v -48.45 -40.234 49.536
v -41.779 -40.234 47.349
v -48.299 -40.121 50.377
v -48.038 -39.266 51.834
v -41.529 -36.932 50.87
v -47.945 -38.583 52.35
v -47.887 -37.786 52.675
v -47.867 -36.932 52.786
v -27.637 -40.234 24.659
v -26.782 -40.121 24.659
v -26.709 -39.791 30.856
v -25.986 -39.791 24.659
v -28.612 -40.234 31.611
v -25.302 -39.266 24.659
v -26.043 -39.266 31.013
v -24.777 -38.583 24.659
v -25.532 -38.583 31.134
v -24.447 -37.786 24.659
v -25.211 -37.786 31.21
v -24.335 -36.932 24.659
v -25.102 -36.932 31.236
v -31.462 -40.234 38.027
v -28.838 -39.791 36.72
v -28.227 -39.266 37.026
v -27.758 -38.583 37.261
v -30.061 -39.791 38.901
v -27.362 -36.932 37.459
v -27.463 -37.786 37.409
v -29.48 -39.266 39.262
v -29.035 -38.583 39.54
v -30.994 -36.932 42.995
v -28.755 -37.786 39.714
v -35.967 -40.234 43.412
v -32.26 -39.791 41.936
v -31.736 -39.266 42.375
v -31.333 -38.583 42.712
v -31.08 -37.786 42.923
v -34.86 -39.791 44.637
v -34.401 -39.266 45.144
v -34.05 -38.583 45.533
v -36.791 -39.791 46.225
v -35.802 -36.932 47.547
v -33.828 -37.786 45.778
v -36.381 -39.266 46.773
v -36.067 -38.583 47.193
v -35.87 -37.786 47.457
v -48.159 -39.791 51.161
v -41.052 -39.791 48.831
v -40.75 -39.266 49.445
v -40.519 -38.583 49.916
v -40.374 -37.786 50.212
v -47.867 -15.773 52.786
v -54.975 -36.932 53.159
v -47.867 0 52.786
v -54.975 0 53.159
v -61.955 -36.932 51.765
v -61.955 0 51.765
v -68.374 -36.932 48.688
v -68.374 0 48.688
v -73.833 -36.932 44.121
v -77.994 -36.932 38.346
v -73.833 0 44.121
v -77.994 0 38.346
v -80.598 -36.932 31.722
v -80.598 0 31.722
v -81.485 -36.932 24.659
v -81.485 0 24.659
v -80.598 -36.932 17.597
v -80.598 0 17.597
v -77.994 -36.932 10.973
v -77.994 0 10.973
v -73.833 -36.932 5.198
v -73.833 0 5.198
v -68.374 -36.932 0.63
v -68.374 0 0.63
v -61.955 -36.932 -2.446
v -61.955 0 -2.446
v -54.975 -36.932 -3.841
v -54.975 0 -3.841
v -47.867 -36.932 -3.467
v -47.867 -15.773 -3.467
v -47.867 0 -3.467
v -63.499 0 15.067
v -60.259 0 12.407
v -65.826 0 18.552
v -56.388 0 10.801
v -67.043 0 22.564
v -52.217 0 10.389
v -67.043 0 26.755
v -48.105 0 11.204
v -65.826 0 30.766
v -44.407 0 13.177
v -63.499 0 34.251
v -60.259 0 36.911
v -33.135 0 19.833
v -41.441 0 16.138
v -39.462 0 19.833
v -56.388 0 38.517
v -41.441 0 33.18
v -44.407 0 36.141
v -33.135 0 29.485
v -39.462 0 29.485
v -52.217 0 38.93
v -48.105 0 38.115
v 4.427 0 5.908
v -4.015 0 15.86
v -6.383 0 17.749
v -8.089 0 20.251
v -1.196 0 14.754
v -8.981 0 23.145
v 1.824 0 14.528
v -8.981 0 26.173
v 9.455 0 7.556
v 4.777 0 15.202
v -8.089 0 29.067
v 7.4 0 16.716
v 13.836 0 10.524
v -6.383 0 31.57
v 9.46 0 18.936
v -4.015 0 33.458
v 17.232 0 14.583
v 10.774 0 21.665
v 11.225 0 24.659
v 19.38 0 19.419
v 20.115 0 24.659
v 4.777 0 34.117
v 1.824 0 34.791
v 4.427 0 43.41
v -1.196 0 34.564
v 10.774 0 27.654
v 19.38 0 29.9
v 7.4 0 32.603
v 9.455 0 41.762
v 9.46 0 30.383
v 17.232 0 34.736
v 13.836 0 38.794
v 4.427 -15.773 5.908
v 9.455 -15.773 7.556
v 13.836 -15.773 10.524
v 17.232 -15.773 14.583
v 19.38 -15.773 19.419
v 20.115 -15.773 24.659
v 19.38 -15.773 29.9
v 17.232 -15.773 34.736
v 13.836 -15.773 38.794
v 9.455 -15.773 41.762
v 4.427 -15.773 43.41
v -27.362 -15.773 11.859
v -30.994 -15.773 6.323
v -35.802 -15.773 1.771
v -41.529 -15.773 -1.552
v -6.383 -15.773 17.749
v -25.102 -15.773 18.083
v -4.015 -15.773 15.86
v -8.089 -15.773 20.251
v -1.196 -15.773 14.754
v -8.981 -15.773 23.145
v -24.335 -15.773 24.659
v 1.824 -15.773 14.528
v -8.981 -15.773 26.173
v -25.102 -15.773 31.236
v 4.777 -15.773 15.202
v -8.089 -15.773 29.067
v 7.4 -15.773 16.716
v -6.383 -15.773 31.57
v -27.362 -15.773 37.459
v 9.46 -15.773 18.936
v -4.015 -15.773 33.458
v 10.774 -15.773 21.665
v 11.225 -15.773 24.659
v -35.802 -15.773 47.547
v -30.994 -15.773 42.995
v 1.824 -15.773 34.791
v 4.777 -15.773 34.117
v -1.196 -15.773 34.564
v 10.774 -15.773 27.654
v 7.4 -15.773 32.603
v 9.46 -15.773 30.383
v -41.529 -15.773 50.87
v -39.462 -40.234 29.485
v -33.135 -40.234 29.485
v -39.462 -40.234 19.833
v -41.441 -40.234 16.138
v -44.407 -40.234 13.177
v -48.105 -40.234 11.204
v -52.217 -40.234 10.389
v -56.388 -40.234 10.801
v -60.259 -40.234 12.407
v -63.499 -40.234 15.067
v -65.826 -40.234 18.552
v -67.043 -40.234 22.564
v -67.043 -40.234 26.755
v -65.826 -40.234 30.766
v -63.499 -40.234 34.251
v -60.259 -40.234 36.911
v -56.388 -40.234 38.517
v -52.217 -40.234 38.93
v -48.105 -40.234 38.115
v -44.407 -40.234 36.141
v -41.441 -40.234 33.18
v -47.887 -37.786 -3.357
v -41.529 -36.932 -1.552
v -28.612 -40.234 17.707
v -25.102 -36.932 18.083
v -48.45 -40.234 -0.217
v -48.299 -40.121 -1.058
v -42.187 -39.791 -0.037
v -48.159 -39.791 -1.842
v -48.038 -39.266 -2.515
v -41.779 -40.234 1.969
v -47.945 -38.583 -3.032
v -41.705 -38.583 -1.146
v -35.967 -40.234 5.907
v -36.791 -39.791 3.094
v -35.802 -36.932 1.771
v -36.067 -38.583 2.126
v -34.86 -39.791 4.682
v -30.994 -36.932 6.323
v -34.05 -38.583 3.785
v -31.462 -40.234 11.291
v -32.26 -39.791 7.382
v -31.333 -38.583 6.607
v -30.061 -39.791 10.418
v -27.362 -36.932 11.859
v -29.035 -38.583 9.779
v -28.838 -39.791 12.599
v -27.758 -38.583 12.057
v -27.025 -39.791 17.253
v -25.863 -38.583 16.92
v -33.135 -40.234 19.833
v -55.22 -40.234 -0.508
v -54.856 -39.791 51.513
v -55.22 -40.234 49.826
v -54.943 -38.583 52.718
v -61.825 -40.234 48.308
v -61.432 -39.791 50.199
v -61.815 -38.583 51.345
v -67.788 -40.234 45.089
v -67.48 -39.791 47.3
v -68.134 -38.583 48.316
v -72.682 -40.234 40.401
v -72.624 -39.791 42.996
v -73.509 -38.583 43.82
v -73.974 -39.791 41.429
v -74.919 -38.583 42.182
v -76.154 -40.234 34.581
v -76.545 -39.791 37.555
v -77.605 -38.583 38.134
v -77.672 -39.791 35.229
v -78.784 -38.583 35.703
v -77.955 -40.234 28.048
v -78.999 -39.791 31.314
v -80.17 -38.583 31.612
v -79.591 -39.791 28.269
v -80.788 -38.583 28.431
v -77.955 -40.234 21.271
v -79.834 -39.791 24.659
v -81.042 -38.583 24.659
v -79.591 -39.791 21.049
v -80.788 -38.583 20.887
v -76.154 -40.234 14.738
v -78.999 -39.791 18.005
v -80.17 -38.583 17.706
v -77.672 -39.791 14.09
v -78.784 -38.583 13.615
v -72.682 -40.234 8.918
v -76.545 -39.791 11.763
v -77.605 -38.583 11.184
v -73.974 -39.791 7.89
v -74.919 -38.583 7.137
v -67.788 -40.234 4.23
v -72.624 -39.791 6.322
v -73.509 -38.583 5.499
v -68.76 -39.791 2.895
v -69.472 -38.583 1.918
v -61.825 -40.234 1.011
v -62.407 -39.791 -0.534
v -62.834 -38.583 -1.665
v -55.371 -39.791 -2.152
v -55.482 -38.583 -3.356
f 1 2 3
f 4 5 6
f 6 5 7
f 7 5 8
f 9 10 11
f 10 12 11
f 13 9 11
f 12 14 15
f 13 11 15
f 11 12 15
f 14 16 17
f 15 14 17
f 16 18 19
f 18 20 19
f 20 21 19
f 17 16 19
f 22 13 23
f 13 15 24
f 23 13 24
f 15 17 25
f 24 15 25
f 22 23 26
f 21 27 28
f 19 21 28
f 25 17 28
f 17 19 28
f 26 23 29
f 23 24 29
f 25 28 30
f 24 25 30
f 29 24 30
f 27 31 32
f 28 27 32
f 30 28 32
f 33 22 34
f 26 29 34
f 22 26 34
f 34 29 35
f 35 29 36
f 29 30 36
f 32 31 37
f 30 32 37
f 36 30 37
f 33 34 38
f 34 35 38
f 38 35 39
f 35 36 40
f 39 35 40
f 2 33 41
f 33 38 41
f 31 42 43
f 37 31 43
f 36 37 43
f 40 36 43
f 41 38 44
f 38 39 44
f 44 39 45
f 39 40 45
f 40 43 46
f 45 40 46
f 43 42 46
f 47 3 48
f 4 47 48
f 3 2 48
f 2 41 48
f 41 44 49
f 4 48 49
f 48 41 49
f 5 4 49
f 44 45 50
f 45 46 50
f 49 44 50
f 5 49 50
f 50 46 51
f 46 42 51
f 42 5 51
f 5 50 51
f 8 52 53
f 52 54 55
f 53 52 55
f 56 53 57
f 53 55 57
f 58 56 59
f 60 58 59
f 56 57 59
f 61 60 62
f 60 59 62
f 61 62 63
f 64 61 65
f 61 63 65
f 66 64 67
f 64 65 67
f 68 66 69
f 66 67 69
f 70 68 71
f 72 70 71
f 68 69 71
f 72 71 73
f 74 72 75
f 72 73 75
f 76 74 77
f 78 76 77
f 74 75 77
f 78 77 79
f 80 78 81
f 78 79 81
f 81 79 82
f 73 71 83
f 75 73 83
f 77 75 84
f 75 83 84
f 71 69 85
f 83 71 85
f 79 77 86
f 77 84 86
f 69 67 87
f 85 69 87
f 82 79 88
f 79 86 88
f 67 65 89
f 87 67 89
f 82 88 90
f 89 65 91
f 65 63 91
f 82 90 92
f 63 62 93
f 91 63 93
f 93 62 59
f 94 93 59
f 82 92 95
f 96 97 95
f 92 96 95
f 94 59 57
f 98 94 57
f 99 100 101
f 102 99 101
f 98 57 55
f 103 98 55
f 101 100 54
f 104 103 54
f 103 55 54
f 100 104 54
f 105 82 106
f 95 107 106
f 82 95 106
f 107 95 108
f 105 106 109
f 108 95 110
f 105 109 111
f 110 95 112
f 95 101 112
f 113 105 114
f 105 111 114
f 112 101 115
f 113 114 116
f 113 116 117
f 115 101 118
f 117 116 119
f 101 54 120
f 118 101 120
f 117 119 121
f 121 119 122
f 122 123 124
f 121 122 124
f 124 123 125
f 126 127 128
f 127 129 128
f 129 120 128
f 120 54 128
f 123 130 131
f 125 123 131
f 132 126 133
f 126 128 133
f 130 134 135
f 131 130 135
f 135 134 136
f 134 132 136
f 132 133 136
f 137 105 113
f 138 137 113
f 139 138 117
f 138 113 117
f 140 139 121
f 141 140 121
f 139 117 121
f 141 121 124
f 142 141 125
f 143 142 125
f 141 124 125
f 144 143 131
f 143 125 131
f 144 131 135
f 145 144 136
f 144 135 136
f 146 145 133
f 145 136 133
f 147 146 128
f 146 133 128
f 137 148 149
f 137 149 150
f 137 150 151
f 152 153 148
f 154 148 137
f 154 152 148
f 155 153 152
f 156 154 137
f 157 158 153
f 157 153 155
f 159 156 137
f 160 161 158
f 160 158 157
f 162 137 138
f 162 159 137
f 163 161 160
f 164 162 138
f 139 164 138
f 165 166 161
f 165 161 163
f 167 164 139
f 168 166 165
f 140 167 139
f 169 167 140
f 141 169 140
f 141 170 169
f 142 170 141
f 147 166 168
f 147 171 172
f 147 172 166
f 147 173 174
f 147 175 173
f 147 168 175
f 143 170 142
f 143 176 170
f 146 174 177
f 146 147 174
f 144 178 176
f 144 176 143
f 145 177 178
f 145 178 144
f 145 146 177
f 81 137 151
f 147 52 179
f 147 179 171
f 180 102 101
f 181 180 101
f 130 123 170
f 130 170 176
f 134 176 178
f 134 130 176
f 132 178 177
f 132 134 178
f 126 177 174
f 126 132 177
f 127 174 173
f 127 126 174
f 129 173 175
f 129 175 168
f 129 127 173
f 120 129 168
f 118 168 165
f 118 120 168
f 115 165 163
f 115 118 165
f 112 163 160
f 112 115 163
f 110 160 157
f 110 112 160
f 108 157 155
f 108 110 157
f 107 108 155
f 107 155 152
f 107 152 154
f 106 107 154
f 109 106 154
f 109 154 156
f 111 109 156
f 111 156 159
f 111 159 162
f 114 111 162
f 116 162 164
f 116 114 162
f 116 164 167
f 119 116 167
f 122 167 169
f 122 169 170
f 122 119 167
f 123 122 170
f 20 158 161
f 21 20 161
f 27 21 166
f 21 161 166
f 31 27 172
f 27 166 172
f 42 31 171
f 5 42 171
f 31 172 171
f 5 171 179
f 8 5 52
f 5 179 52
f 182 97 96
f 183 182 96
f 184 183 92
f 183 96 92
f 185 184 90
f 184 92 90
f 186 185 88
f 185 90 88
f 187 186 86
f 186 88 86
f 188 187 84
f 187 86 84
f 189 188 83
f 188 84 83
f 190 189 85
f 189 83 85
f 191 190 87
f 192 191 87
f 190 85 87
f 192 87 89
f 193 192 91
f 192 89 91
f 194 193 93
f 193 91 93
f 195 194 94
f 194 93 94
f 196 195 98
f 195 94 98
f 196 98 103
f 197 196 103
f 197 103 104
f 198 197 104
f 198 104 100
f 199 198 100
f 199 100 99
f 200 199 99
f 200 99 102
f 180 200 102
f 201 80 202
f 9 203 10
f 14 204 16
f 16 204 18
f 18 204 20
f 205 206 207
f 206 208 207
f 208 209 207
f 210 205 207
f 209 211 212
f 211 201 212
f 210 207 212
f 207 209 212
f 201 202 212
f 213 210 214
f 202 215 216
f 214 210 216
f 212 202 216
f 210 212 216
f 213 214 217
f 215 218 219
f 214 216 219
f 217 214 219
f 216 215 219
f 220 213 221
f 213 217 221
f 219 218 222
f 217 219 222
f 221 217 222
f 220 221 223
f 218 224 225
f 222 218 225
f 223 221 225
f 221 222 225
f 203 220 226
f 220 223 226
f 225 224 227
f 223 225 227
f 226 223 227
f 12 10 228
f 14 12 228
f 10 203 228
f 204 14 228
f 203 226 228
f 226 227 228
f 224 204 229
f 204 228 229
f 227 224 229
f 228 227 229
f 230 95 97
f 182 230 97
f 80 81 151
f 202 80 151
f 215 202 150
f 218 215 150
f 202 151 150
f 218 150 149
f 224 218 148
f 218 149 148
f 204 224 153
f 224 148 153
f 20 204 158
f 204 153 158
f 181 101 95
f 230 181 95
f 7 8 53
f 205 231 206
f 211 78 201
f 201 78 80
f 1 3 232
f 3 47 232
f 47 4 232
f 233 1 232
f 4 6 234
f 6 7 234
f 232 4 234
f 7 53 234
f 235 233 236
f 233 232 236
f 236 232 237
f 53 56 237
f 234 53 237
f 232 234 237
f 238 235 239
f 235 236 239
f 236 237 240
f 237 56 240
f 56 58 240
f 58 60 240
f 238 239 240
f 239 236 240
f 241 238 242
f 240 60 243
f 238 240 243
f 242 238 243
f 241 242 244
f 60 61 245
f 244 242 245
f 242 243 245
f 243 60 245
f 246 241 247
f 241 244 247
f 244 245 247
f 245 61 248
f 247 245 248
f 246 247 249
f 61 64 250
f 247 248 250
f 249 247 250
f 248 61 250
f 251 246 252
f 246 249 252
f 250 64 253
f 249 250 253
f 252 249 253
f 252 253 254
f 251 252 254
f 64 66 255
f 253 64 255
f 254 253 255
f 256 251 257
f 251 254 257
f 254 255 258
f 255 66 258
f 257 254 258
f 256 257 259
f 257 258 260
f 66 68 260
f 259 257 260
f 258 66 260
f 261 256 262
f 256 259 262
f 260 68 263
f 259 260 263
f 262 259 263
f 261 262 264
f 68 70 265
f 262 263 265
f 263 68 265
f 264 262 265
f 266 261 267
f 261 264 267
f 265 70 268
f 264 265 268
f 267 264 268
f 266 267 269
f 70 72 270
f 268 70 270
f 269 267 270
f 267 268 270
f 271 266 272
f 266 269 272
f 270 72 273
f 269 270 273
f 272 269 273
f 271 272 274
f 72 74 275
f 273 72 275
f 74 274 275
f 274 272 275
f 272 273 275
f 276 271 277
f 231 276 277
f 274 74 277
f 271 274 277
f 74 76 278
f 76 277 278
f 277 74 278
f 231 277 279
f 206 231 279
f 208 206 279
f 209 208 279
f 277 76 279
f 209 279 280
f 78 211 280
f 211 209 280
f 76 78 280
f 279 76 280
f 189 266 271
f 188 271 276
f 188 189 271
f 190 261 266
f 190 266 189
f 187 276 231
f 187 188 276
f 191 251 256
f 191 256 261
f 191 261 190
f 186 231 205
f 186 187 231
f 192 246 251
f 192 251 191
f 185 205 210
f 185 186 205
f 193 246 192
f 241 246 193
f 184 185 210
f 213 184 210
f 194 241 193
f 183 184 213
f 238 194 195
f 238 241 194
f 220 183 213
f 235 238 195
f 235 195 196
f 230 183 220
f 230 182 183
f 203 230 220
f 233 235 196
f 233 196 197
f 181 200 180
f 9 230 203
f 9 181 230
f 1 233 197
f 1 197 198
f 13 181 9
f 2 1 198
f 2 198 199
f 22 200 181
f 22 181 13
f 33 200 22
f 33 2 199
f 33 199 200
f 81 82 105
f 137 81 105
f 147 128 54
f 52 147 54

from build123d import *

# Parameters (mm, degrees)
F0_R     = 10.16
F1_DEPTH = 15.7734
F2_DEPTH = 40.2336
F3_R     = 3.302


with BuildPart() as f1:
    # F0 (on Front) → F1 (new body)
    with BuildSketch(Plane.XZ):
        with BuildLine():
            ThreePointArc((-47.867193, 52.785754), (-30.993815, 42.995474), (-24.33484, 24.659213))
            ThreePointArc((-24.33484, 24.659213), (-30.993815, 6.322951), (-47.867193, -3.467329))
            Line((-47.867193, -3.467329), (4.426925, 5.908185))
            ThreePointArc((4.426925, 5.908185), (20.11516, 24.659213), (4.426925, 43.41024))
            Line((4.426925, 43.41024), (-47.867193, 52.785754))
        make_face()
        with Locations((1.06516, 24.659213)):
            Circle(F0_R, mode=Mode.SUBTRACT)
    extrude(amount=F1_DEPTH)

    # F0 (on Front) → F2 (join)
    with BuildSketch(Plane.XZ):
        with BuildLine():
            ThreePointArc((-47.867193, -3.467329), (-30.993815, 6.322951), (-24.33484, 24.659213))
            ThreePointArc((-24.33484, 24.659213), (-30.993815, 42.995474), (-47.867193, 52.785754))
            ThreePointArc((-47.867193, 52.785754), (-81.48484, 24.659213), (-47.867193, -3.467329))
        make_face()
        with BuildLine():
            ThreePointArc((-39.462075, 19.833213), (-67.19734, 24.659213), (-39.462075, 29.485213))
            Line((-39.462075, 29.485213), (-33.135355, 29.485213))
            Line((-33.135355, 29.485213), (-33.135355, 24.659213))
            Line((-33.135355, 24.659213), (-33.135355, 19.833213))
            Line((-33.135355, 19.833213), (-39.462075, 19.833213))
        make_face(mode=Mode.SUBTRACT)
    extrude(amount=F2_DEPTH)

    # F3
    f3_edges = [f1.edges().sort_by_distance(p)[0] for p in [
        (-57.952487, -40.2336, 52.785754),
    ]]
    fillet(f3_edges, radius=F3_R)


solid = f1.part
